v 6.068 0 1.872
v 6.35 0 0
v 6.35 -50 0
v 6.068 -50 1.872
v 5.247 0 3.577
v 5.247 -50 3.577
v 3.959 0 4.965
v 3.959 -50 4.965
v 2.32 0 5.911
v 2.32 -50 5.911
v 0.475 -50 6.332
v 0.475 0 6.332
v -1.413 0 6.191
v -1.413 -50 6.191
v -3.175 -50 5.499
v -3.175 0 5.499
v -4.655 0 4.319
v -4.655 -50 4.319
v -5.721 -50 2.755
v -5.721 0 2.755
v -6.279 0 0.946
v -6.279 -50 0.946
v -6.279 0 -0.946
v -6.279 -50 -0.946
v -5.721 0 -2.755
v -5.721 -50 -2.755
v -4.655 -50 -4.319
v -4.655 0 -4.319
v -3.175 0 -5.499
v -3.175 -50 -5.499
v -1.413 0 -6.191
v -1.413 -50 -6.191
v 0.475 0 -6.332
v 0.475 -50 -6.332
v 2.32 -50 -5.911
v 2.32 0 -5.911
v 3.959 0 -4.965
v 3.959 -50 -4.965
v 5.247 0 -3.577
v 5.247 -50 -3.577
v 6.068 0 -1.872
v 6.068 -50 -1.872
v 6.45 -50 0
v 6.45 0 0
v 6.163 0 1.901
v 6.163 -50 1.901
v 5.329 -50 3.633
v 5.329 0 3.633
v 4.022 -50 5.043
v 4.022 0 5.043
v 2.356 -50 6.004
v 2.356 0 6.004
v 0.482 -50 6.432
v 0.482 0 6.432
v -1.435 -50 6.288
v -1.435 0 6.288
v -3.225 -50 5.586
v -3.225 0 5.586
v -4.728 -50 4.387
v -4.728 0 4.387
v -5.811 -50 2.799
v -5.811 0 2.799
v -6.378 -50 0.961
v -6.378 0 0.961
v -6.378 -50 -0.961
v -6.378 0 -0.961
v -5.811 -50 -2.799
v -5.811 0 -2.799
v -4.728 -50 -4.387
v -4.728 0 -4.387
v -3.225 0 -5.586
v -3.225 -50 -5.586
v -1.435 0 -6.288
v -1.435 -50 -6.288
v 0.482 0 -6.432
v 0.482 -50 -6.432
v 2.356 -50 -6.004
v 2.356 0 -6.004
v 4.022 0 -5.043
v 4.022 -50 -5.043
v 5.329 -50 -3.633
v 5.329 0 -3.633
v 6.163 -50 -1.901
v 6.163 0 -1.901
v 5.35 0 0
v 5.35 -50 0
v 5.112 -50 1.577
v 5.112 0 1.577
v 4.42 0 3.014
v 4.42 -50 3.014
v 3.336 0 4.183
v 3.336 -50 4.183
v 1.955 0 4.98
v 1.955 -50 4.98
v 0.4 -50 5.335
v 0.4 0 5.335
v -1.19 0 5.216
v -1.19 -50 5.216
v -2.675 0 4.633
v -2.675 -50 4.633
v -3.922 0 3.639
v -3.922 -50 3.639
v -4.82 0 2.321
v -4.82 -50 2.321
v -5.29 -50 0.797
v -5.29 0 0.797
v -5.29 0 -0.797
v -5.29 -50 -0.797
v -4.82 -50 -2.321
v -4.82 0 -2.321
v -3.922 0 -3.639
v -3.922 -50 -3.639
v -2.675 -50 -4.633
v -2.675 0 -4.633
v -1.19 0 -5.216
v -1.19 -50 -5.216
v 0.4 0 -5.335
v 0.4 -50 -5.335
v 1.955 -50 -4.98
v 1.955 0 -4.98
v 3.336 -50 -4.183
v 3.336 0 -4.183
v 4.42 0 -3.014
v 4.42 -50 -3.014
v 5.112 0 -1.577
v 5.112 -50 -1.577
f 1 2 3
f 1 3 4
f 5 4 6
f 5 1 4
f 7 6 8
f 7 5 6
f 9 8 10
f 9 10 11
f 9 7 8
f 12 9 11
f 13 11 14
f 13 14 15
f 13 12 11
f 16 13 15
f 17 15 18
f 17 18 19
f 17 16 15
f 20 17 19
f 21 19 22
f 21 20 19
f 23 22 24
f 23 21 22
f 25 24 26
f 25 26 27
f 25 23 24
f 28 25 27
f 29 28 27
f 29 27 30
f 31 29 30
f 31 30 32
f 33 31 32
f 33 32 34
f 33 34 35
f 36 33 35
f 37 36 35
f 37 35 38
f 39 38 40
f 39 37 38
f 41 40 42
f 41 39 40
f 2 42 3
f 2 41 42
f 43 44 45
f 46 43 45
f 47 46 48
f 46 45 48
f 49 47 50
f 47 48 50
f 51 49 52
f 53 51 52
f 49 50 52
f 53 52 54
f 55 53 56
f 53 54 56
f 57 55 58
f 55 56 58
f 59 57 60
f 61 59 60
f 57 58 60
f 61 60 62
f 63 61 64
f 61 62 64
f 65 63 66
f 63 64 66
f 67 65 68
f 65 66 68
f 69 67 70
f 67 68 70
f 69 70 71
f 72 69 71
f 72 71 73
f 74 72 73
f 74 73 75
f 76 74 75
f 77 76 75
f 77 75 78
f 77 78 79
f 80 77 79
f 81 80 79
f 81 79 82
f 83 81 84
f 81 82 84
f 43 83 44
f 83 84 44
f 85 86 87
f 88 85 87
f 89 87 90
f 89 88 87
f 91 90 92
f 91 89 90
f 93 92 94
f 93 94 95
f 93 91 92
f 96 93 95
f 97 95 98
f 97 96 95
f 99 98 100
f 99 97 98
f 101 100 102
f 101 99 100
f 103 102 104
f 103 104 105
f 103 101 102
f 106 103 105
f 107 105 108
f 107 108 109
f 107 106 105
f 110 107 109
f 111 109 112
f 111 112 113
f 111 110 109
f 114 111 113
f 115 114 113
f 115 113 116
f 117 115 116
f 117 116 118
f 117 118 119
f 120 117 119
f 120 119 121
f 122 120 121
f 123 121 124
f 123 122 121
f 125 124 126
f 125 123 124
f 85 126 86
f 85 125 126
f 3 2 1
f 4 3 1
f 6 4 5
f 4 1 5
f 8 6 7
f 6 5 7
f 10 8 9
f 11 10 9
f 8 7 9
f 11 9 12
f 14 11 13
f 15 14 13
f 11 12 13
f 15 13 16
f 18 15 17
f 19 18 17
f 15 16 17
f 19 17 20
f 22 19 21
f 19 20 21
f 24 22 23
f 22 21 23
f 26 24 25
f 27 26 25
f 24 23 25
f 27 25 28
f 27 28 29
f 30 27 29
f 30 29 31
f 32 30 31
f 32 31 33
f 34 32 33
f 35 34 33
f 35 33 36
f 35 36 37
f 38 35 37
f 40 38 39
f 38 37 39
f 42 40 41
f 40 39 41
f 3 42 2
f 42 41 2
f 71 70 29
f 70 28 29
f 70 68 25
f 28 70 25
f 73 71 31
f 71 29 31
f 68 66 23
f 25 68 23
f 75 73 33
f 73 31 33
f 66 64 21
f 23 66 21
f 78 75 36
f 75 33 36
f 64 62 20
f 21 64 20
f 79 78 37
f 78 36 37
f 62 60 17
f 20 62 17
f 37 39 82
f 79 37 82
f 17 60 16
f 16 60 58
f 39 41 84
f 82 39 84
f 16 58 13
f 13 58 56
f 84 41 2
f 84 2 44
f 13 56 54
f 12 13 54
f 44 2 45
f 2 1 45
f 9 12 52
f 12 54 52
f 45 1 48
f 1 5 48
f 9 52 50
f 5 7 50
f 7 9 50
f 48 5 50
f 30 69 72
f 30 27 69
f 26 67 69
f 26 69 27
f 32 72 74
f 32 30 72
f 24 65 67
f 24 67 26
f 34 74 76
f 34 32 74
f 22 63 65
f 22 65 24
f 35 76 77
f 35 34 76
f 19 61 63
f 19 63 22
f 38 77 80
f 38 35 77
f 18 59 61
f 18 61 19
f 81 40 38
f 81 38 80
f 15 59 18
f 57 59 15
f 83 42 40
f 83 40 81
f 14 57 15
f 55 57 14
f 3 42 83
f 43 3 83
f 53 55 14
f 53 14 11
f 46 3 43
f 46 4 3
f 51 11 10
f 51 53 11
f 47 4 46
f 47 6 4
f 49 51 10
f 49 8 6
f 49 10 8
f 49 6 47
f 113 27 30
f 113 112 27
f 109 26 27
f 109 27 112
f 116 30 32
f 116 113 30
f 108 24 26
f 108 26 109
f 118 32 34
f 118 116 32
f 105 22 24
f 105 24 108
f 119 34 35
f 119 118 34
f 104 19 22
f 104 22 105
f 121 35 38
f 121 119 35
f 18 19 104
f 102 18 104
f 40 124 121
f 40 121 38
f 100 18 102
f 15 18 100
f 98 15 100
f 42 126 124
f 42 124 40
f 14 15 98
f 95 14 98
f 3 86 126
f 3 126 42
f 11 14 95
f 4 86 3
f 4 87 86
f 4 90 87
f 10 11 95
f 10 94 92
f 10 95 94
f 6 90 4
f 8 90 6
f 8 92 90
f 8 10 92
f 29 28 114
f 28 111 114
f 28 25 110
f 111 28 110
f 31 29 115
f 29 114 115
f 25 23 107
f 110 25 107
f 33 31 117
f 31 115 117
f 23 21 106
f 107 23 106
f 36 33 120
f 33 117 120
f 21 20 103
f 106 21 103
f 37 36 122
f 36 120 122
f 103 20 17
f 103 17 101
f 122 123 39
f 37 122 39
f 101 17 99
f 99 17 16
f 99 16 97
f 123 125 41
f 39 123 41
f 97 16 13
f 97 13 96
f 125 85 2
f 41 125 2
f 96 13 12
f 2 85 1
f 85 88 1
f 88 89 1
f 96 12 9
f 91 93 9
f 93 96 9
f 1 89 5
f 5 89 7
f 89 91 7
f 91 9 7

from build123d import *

# Parameters (mm, degrees)
F0_R     = 6.35
F0_R_2   = 5.35
F1_DEPTH = 50
F2_R     = 6.45
F2_R_2   = 6.35
F3_DEPTH = 50


with BuildPart() as f1:
    # F0 (on Front) → F1 (new body)
    with BuildSketch(Plane.XZ):
        Circle(F0_R)
        Circle(F0_R_2, mode=Mode.SUBTRACT)
    extrude(amount=F1_DEPTH)


with BuildPart() as f3:
    # F2 (on Front) → F3 (new body, through all)
    with BuildSketch(Plane.XZ):
        Circle(F2_R)
        Circle(F2_R_2, mode=Mode.SUBTRACT)
    extrude(amount=F3_DEPTH)


solid = Compound([f1.part, f3.part])
